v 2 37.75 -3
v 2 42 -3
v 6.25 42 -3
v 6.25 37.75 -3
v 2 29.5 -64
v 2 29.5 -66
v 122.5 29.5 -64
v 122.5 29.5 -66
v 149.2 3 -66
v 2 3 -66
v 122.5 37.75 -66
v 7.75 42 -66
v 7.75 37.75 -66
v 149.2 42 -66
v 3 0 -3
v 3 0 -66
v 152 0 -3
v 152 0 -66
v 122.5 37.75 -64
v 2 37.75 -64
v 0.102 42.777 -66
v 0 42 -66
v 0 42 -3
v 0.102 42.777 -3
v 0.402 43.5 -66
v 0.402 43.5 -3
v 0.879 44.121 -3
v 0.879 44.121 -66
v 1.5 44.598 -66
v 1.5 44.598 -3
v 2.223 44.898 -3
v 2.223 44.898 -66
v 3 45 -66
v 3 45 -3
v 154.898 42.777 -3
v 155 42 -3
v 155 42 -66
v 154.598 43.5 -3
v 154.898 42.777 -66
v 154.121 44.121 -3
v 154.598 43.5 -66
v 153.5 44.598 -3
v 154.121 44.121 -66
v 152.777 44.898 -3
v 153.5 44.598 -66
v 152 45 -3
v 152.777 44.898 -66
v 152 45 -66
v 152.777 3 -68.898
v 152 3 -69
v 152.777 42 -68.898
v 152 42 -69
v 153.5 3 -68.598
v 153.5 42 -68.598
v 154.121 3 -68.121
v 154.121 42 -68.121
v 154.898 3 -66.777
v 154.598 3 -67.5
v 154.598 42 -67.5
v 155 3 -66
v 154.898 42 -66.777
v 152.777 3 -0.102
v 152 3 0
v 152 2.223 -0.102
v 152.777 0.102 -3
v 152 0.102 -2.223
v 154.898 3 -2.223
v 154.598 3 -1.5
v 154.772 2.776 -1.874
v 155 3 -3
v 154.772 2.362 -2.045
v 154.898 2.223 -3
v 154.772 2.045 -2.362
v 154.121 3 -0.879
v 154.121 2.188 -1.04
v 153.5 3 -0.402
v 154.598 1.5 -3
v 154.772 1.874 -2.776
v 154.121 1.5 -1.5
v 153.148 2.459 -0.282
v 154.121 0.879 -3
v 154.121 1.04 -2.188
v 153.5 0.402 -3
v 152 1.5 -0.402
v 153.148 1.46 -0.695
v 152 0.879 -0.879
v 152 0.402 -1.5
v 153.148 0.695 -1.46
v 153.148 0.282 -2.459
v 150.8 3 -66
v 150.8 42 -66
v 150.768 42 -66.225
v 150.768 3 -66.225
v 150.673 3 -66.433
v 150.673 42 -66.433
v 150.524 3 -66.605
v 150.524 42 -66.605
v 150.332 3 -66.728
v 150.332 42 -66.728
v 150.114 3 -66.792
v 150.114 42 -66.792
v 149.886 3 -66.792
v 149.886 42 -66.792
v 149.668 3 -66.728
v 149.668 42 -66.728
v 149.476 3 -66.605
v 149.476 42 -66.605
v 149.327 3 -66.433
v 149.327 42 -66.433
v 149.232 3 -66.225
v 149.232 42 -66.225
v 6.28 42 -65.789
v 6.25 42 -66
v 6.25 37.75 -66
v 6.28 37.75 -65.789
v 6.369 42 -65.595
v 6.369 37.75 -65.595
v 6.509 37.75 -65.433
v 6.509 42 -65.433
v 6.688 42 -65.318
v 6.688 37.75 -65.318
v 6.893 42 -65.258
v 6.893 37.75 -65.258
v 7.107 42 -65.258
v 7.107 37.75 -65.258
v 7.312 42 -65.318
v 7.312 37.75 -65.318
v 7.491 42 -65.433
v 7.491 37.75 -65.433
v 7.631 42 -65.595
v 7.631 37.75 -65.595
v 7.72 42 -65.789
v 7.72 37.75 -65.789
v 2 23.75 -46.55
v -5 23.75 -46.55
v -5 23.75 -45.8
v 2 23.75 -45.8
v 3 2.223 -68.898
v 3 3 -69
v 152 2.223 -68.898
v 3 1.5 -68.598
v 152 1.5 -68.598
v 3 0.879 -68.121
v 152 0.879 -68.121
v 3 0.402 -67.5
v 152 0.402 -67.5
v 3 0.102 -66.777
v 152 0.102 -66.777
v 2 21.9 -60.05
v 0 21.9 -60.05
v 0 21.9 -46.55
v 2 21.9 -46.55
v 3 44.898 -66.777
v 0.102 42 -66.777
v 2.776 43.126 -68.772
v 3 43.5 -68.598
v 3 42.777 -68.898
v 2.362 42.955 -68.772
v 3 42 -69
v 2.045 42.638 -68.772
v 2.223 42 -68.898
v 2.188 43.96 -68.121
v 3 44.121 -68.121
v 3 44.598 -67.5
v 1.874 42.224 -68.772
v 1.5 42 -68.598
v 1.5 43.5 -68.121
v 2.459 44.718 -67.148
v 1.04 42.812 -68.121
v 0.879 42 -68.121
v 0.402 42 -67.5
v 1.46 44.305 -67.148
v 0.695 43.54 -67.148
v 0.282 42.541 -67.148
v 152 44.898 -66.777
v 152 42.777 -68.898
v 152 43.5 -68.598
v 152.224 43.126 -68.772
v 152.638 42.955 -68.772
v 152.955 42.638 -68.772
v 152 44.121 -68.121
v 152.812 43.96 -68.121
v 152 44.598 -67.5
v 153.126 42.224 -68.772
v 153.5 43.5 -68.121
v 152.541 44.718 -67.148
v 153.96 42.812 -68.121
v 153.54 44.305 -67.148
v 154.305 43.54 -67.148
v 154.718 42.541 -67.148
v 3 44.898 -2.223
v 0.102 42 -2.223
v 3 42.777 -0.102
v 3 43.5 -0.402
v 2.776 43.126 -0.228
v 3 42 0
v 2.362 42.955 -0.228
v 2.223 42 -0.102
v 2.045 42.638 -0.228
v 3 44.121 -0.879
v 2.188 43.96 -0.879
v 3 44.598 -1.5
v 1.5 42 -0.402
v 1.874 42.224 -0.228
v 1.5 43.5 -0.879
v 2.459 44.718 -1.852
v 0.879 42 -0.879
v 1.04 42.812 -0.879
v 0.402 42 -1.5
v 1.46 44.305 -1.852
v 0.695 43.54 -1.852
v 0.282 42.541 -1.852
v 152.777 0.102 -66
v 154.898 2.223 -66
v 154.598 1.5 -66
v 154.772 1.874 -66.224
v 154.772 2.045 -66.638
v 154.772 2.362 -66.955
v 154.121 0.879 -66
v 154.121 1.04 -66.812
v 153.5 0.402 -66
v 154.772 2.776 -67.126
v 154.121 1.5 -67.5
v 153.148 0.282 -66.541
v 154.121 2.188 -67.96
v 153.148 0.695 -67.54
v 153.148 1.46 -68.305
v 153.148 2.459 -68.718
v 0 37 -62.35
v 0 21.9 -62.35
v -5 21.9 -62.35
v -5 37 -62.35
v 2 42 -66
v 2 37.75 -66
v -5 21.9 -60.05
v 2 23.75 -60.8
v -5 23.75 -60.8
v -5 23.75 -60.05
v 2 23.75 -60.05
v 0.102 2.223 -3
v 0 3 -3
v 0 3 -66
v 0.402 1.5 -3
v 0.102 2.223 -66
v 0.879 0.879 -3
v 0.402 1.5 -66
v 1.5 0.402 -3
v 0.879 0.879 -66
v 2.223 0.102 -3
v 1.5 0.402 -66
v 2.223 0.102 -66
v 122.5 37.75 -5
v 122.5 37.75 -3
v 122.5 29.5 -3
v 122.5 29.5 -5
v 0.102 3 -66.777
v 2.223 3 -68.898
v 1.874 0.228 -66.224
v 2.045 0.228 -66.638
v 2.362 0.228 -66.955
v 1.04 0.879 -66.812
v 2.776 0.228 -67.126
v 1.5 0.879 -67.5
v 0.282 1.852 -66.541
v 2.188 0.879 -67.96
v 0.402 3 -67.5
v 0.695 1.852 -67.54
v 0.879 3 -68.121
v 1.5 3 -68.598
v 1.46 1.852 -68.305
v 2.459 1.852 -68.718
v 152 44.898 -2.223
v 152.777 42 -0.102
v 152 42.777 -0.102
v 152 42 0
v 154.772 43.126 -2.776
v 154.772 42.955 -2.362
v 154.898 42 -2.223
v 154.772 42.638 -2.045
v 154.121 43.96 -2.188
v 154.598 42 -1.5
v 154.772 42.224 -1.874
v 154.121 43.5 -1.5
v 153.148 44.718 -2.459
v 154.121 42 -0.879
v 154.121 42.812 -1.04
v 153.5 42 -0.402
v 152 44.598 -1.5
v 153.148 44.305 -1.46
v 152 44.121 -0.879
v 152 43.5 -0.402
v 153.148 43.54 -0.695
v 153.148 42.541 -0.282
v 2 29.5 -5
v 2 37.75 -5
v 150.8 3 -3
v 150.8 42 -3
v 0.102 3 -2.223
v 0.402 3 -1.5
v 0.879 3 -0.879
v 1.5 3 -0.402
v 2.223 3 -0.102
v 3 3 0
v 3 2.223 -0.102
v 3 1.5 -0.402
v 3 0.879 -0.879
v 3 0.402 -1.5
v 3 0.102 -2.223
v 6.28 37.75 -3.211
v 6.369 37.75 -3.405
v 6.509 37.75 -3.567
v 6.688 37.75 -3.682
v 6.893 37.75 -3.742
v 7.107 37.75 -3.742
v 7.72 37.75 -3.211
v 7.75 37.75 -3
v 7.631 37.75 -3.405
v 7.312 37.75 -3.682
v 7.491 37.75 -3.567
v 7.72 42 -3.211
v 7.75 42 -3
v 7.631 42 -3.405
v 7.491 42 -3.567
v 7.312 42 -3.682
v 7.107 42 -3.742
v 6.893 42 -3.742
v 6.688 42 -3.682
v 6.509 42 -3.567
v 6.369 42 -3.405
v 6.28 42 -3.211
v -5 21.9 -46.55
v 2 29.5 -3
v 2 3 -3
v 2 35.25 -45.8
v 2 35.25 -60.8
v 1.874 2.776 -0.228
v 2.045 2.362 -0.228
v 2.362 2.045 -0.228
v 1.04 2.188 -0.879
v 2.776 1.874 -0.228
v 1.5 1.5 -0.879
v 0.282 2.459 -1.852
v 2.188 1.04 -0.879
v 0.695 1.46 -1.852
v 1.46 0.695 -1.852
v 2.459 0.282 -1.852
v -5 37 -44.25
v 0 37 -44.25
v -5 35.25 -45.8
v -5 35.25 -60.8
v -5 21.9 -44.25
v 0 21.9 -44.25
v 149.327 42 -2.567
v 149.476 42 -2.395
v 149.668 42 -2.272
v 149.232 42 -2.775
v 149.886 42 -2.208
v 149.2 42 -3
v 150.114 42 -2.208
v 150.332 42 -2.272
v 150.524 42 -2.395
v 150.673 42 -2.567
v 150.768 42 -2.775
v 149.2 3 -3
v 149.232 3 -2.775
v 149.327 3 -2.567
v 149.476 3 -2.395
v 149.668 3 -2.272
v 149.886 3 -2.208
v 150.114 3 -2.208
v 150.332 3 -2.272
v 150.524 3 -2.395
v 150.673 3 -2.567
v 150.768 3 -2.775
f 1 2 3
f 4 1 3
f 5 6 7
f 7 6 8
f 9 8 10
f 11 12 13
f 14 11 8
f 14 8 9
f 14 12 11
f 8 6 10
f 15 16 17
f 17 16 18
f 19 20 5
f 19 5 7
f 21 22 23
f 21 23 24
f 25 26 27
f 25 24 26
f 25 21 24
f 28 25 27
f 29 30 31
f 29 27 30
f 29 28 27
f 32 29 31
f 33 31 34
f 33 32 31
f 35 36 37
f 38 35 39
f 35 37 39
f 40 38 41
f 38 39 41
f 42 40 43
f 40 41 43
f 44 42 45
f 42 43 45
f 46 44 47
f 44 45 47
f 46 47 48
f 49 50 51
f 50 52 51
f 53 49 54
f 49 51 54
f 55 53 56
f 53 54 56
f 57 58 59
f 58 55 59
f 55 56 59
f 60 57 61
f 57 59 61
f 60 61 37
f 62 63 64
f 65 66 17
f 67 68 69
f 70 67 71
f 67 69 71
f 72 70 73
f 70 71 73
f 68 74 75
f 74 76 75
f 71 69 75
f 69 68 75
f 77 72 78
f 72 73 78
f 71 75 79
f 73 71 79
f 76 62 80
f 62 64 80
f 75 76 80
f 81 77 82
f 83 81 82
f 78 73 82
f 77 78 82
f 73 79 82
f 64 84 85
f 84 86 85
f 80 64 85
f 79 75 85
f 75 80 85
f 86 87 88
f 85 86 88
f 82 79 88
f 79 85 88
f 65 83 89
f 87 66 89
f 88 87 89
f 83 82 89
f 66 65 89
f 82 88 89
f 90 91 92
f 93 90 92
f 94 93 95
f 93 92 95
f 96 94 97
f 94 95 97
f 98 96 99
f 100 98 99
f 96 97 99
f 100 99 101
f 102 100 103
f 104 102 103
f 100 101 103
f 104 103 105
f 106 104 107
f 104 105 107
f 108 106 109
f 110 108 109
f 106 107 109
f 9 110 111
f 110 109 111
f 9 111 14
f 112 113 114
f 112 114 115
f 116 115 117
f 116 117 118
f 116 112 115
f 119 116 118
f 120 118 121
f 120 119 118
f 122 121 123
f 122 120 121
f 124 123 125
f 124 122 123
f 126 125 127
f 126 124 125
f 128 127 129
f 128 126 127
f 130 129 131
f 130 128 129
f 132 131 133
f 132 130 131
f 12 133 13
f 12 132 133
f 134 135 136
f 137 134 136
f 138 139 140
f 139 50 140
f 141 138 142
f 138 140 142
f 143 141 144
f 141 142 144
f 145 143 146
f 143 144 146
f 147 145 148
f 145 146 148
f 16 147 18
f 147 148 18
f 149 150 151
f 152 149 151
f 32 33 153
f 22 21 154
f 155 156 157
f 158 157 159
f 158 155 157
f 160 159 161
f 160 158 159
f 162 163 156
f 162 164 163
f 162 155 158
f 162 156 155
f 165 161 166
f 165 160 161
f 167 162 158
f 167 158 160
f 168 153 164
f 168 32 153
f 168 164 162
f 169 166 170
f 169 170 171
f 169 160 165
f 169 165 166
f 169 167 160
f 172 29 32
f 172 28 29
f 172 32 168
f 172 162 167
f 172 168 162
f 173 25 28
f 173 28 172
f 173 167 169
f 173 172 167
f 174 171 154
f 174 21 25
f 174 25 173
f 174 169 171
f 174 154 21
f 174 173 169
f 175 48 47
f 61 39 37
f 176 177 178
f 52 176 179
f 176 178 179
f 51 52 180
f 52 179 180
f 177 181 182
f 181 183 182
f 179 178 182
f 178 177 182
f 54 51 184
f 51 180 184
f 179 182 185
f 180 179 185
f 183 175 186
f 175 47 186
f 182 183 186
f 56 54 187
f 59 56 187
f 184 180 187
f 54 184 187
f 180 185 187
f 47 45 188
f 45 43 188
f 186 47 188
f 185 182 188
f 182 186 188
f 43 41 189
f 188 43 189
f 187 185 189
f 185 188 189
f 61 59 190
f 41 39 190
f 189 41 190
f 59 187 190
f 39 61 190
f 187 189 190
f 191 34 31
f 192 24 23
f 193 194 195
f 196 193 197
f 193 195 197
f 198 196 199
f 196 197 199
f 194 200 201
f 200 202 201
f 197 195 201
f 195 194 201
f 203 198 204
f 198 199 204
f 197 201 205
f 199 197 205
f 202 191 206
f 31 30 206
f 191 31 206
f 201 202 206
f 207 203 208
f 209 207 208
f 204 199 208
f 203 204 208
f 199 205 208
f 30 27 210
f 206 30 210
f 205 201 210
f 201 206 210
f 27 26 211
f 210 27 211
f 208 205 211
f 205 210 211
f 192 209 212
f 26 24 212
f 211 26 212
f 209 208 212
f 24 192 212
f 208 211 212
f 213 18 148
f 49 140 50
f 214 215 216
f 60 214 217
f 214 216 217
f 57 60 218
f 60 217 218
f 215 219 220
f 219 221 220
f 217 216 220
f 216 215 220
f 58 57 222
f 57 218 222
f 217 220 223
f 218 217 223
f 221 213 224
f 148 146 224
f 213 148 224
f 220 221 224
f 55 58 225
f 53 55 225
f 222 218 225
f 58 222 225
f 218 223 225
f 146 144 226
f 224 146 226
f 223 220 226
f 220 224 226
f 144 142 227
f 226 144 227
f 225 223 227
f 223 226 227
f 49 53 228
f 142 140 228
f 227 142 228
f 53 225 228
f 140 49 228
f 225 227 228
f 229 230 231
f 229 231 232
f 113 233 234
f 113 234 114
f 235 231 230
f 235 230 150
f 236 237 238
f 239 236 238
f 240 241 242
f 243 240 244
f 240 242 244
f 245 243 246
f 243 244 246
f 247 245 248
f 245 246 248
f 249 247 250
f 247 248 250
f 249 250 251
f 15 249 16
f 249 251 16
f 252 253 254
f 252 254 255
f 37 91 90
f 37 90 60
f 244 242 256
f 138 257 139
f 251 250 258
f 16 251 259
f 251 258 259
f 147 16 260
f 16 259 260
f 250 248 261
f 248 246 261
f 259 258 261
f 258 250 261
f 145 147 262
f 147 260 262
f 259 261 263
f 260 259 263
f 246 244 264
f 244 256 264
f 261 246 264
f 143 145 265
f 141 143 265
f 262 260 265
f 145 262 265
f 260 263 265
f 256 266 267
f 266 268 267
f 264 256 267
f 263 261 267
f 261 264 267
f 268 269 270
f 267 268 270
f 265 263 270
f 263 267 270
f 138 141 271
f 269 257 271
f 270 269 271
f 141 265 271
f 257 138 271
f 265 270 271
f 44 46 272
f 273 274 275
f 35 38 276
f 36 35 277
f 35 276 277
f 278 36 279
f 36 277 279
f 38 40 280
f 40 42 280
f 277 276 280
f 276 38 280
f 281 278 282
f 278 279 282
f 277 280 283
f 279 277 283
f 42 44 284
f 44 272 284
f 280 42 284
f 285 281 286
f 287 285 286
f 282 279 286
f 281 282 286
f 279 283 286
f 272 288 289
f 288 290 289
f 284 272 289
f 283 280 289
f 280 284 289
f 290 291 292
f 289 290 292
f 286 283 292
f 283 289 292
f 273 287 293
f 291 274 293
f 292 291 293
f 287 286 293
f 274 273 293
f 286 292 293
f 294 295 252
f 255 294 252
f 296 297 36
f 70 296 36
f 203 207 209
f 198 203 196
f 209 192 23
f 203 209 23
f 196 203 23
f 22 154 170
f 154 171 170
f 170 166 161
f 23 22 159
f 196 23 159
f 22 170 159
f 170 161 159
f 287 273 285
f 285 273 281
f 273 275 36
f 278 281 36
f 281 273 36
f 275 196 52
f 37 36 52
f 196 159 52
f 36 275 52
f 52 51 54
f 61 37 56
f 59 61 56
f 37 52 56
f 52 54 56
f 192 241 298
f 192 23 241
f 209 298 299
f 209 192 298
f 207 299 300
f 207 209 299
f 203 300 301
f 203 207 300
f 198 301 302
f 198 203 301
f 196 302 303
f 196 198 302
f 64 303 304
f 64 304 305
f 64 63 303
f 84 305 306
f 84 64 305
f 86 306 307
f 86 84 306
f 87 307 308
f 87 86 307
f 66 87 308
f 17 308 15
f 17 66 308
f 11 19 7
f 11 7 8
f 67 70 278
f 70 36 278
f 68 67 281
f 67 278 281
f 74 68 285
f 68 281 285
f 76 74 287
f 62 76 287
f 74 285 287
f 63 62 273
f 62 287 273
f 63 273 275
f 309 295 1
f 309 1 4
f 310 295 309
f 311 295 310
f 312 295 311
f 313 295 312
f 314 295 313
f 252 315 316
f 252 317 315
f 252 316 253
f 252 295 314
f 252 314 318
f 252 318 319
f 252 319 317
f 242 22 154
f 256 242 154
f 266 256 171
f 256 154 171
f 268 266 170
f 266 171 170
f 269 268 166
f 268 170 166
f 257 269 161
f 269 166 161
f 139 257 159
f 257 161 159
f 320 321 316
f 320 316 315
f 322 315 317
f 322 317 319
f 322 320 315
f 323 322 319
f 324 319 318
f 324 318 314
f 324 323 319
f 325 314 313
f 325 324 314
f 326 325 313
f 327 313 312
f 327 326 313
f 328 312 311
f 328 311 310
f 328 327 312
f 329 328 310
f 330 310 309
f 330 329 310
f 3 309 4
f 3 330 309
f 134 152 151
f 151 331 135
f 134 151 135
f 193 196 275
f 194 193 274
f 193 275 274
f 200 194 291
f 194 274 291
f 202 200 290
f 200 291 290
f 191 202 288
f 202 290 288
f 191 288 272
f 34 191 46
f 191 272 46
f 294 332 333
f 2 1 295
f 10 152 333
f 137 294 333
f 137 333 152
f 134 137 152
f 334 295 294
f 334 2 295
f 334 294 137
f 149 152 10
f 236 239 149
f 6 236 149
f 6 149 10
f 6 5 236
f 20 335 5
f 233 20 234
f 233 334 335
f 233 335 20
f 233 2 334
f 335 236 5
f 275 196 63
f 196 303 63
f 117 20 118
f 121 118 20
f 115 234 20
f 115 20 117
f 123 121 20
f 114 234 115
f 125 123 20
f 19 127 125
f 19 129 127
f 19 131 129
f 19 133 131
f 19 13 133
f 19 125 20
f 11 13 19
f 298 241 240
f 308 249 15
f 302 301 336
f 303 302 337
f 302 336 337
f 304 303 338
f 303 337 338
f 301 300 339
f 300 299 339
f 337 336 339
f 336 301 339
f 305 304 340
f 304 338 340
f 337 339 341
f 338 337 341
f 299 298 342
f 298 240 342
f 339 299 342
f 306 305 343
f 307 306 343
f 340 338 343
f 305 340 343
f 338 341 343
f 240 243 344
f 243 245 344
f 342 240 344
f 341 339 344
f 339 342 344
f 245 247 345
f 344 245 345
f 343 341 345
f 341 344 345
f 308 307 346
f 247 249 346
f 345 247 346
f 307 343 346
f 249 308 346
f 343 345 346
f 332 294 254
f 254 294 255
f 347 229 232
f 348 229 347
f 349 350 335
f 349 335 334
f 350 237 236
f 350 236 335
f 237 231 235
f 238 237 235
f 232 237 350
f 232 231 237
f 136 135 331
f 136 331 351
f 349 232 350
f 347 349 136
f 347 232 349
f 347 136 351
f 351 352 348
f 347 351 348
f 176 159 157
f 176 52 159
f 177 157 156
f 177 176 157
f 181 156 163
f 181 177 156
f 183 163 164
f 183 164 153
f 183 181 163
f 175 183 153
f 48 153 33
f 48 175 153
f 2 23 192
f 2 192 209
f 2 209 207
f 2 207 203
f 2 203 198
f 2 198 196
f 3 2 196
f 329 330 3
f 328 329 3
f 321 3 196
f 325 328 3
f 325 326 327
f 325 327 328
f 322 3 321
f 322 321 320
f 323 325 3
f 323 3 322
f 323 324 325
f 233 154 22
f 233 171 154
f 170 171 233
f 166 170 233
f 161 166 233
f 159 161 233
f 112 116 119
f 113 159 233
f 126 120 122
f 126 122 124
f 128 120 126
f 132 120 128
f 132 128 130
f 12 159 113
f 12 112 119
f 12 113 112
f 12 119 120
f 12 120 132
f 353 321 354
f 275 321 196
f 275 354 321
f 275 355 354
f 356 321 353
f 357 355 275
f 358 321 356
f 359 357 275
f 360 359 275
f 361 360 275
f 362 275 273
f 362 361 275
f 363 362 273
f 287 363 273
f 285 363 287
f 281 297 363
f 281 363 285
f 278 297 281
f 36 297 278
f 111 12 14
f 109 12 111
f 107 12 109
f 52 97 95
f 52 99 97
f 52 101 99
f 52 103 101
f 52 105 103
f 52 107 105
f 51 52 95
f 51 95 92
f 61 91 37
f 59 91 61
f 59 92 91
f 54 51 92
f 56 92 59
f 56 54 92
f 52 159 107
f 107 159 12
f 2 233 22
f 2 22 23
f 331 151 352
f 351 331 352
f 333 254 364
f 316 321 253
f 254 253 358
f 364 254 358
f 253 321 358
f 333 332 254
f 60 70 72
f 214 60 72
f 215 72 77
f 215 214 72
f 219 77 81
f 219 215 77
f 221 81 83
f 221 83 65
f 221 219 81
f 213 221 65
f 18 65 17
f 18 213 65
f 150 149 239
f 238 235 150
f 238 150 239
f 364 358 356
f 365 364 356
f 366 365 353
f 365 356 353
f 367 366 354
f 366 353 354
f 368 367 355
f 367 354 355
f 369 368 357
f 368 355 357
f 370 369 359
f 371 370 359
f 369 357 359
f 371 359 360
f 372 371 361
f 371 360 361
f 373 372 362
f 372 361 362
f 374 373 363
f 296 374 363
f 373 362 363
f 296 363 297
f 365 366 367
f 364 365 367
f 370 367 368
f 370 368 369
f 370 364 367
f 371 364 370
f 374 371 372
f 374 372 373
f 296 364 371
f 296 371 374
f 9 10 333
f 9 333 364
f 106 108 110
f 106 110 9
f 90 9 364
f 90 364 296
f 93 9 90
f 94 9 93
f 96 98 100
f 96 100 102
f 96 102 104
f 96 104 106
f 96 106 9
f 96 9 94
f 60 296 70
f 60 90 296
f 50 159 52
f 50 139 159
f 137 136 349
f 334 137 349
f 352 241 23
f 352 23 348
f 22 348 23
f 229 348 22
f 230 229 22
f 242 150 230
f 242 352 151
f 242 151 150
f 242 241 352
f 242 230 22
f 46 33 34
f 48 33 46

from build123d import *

# Parameters (mm, degrees)
ESBO_O1_W                = 155
ESBO_O1_H                = 69
RESSALTO_EXTRUS_O1_DEPTH = 42
ESBO_O2_W                = 153
ESBO_O2_H                = 63
CORTE_EXTRUS_O1_DEPTH    = 39
RESSALTO_EXTRUS_O3_START = -4.25
ESBO_O5_W                = 120.5
ESBO_O5_H                = 2
RESSALTO_EXTRUS_O3_DEPTH = 8.25
ESBO_O7_R                = 0.8
CORTE_EXTRUS_O4_DEPTH    = 39
ESBO_O10_R               = 0.75
RESSALTO_EXTRUS_O5_DEPTH = 4.25
ESBO_O9_W                = 155
ESBO_O9_H                = 69
RESSALTO_EXTRUS_O4_DEPTH = 3
FILETE6_R                = 3
FILETE7_R                = 3
ESBO_O11_W               = 18.1
ESBO_O11_H               = 15.1
RESSALTO_EXTRUS_O6_DEPTH = 5
ESBO_O12_W               = 15
ESBO_O12_H               = 11.5
CORTE_EXTRUS_O5_DEPTH    = 9
ESBO_O14_W               = 13.5
ESBO_O14_H               = 1.85
CORTE_EXTRUS_O6_DEPTH    = 180.961106909


with BuildPart() as part:
    # Esboço1 → Ressalto-extrusão1 (new body)
    with BuildSketch(Plane(origin=(0, 0, 0), x_dir=(1, 0, 0), z_dir=(0, 1, 0))):
        with Locations((77.5, 34.5)):
            Rectangle(ESBO_O1_W, ESBO_O1_H)
    extrude(amount=RESSALTO_EXTRUS_O1_DEPTH)

    # Esboço2 → Corte-extrusão1 (cut)
    with BuildSketch(Plane(origin=(0, 42, 0), x_dir=(1, 0, 0), z_dir=(0, 1, 0))):
        with Locations((78.5, 34.5)):
            Rectangle(ESBO_O2_W, ESBO_O2_H)
    extrude(amount=-CORTE_EXTRUS_O1_DEPTH, mode=Mode.SUBTRACT)

    # Esboço5 → Ressalto-extrusão3 (add)
    with BuildSketch(Plane(origin=(0, 42, 0), x_dir=(1, 0, 0), z_dir=(0, 1, 0)).offset(RESSALTO_EXTRUS_O3_START)):
        with Locations((62.25, 4)):
            Rectangle(ESBO_O5_W, ESBO_O5_H)
        with Locations((62.25, 65)):
            Rectangle(ESBO_O5_W, ESBO_O5_H)
    extrude(amount=-RESSALTO_EXTRUS_O3_DEPTH)

    # Esboço7 → Corte-extrusão4 (cut)
    with BuildSketch(Plane(origin=(0, 42, 0), x_dir=(1, 0, 0), z_dir=(0, 1, 0))):
        with Locations((150, 3)):
            Circle(ESBO_O7_R)
        with Locations((150, 66)):
            Circle(ESBO_O7_R)
    extrude(amount=-CORTE_EXTRUS_O4_DEPTH, mode=Mode.SUBTRACT)

    # Esboço10 → Ressalto-extrusão5 (add)
    with BuildSketch(Plane(origin=(0, 42, 0), x_dir=(1, 0, 0), z_dir=(0, 1, 0))):
        with Locations((7, 3)):
            Circle(ESBO_O10_R)
        with Locations((7, 66)):
            Circle(ESBO_O10_R)
    extrude(amount=-RESSALTO_EXTRUS_O5_DEPTH)

    # Filete6
    filete6_edges = [part.edges().sort_by_distance(p)[0] for p in [
        (0, 21, -69),
        (0, 0, -34.5),
        (0, 21, 0),
        (77.5, 0, 0),
        (155, 21, 0),
        (77.5, 0, -69),
        (155, 0, -34.5),
        (155, 21, -69),
    ]]
    fillet(filete6_edges, radius=FILETE6_R - 0.0001)  # a hair under: the kernel refuses the full size

    # Esboço11 → Ressalto-extrusão6 (add)
    with BuildSketch(Plane.ZY):
        with Locations((-53.3, 29.45)):
            Rectangle(ESBO_O11_W, ESBO_O11_H)
    extrude(amount=RESSALTO_EXTRUS_O6_DEPTH)

    # Esboço12 → Corte-extrusão5 (cut)
    with BuildSketch(Plane.ZY.offset(5)):
        with Locations((-53.3, 29.5)):
            Rectangle(ESBO_O12_W, ESBO_O12_H)
    extrude(amount=-CORTE_EXTRUS_O5_DEPTH, mode=Mode.SUBTRACT)

    # Esboço14 → Corte-extrusão6 (cut, through all)
    with BuildSketch(Plane.ZY.offset(5)):
        with Locations((-53.3, 22.825)):
            Rectangle(ESBO_O14_W, ESBO_O14_H)
    extrude(amount=-CORTE_EXTRUS_O6_DEPTH, mode=Mode.SUBTRACT)


with BuildPart() as body_2:
    # Esboço9 → Ressalto-extrusão4 (new body)
    with BuildSketch(Plane(origin=(0, 42, 0), x_dir=(1, 0, 0), z_dir=(0, 1, 0))):
        with Locations((77.5, 34.5)):
            Rectangle(ESBO_O9_W, ESBO_O9_H)
    extrude(amount=RESSALTO_EXTRUS_O4_DEPTH)

    # Filete7
    filete7_edges = [body_2.edges().sort_by_distance(p)[0] for p in [
        (0, 45, -34.5),
        (77.5, 45, 0),
        (155, 45, -34.5),
        (77.5, 45, -69),
        (155, 43.5, 0),
        (0, 43.5, 0),
        (0, 43.5, -69),
        (155, 43.5, -69),
    ]]
    fillet(filete7_edges, radius=FILETE7_R - 0.0001)  # a hair under: the kernel refuses the full size


solid = Compound([part.part, body_2.part])
